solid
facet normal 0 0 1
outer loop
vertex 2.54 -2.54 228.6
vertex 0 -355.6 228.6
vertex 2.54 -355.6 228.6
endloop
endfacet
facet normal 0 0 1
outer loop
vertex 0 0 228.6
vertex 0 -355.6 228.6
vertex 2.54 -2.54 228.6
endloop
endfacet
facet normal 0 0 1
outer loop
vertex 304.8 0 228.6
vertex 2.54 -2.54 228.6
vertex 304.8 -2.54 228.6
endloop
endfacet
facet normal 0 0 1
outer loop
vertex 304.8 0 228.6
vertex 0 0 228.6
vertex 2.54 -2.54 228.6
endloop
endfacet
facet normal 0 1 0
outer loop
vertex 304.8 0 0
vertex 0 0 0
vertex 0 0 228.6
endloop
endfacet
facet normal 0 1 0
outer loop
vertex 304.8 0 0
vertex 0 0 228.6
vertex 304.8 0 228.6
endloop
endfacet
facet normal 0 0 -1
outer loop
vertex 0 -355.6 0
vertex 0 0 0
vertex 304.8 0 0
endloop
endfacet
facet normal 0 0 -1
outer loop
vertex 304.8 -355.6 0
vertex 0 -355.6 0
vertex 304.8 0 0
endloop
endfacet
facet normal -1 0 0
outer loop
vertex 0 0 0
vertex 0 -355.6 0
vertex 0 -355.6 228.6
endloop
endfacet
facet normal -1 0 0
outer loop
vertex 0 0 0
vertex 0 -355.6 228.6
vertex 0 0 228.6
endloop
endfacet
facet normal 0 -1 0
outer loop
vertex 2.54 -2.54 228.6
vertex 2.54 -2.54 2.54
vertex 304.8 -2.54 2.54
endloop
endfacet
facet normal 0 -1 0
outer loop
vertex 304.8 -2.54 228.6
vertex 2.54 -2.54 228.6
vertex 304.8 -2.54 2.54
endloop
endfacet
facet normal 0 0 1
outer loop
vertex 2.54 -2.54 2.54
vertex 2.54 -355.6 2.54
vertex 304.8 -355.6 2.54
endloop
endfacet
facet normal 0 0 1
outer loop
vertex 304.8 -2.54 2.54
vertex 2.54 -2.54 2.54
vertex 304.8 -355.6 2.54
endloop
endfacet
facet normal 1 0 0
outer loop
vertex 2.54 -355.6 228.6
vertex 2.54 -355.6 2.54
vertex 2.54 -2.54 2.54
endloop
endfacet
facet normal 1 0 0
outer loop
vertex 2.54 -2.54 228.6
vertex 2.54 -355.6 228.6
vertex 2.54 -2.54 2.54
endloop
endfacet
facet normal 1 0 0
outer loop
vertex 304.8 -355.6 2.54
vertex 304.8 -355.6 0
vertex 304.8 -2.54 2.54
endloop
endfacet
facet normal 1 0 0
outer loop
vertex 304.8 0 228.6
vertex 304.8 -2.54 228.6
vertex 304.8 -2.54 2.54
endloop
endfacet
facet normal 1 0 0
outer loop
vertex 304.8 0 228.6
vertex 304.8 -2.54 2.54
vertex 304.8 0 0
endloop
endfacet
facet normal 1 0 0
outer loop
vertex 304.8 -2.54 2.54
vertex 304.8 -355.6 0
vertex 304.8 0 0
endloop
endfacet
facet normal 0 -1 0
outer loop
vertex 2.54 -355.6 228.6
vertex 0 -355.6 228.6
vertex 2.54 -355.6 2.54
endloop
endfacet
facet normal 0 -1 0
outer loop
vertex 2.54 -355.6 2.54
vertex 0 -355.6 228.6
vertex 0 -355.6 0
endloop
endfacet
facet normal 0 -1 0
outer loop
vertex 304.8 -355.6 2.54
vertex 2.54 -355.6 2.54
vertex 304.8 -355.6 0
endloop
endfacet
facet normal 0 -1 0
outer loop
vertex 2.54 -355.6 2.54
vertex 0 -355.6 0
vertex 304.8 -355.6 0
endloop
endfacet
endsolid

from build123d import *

# Parameters (mm, degrees)
F0_W     = 304.8
F0_H     = 355.6
F1_DEPTH = 228.6
F2_T     = -2.54


with BuildPart() as f1:
    # F0 (on Top) → F1 (new body)
    with BuildSketch(Plane.XY):
        with Locations((152.4, -177.8)):
            Rectangle(F0_W, F0_H)
    extrude(amount=F1_DEPTH)

    # F2
    f2_openings = [f1.faces().sort_by_distance(p)[0] for p in [
        (152.4, -177.8, 228.6),
        (152.4, -355.6, 114.3),
        (304.8, -177.8, 114.3),
    ]]
    offset(amount=F2_T, openings=f2_openings)


solid = f1.part
